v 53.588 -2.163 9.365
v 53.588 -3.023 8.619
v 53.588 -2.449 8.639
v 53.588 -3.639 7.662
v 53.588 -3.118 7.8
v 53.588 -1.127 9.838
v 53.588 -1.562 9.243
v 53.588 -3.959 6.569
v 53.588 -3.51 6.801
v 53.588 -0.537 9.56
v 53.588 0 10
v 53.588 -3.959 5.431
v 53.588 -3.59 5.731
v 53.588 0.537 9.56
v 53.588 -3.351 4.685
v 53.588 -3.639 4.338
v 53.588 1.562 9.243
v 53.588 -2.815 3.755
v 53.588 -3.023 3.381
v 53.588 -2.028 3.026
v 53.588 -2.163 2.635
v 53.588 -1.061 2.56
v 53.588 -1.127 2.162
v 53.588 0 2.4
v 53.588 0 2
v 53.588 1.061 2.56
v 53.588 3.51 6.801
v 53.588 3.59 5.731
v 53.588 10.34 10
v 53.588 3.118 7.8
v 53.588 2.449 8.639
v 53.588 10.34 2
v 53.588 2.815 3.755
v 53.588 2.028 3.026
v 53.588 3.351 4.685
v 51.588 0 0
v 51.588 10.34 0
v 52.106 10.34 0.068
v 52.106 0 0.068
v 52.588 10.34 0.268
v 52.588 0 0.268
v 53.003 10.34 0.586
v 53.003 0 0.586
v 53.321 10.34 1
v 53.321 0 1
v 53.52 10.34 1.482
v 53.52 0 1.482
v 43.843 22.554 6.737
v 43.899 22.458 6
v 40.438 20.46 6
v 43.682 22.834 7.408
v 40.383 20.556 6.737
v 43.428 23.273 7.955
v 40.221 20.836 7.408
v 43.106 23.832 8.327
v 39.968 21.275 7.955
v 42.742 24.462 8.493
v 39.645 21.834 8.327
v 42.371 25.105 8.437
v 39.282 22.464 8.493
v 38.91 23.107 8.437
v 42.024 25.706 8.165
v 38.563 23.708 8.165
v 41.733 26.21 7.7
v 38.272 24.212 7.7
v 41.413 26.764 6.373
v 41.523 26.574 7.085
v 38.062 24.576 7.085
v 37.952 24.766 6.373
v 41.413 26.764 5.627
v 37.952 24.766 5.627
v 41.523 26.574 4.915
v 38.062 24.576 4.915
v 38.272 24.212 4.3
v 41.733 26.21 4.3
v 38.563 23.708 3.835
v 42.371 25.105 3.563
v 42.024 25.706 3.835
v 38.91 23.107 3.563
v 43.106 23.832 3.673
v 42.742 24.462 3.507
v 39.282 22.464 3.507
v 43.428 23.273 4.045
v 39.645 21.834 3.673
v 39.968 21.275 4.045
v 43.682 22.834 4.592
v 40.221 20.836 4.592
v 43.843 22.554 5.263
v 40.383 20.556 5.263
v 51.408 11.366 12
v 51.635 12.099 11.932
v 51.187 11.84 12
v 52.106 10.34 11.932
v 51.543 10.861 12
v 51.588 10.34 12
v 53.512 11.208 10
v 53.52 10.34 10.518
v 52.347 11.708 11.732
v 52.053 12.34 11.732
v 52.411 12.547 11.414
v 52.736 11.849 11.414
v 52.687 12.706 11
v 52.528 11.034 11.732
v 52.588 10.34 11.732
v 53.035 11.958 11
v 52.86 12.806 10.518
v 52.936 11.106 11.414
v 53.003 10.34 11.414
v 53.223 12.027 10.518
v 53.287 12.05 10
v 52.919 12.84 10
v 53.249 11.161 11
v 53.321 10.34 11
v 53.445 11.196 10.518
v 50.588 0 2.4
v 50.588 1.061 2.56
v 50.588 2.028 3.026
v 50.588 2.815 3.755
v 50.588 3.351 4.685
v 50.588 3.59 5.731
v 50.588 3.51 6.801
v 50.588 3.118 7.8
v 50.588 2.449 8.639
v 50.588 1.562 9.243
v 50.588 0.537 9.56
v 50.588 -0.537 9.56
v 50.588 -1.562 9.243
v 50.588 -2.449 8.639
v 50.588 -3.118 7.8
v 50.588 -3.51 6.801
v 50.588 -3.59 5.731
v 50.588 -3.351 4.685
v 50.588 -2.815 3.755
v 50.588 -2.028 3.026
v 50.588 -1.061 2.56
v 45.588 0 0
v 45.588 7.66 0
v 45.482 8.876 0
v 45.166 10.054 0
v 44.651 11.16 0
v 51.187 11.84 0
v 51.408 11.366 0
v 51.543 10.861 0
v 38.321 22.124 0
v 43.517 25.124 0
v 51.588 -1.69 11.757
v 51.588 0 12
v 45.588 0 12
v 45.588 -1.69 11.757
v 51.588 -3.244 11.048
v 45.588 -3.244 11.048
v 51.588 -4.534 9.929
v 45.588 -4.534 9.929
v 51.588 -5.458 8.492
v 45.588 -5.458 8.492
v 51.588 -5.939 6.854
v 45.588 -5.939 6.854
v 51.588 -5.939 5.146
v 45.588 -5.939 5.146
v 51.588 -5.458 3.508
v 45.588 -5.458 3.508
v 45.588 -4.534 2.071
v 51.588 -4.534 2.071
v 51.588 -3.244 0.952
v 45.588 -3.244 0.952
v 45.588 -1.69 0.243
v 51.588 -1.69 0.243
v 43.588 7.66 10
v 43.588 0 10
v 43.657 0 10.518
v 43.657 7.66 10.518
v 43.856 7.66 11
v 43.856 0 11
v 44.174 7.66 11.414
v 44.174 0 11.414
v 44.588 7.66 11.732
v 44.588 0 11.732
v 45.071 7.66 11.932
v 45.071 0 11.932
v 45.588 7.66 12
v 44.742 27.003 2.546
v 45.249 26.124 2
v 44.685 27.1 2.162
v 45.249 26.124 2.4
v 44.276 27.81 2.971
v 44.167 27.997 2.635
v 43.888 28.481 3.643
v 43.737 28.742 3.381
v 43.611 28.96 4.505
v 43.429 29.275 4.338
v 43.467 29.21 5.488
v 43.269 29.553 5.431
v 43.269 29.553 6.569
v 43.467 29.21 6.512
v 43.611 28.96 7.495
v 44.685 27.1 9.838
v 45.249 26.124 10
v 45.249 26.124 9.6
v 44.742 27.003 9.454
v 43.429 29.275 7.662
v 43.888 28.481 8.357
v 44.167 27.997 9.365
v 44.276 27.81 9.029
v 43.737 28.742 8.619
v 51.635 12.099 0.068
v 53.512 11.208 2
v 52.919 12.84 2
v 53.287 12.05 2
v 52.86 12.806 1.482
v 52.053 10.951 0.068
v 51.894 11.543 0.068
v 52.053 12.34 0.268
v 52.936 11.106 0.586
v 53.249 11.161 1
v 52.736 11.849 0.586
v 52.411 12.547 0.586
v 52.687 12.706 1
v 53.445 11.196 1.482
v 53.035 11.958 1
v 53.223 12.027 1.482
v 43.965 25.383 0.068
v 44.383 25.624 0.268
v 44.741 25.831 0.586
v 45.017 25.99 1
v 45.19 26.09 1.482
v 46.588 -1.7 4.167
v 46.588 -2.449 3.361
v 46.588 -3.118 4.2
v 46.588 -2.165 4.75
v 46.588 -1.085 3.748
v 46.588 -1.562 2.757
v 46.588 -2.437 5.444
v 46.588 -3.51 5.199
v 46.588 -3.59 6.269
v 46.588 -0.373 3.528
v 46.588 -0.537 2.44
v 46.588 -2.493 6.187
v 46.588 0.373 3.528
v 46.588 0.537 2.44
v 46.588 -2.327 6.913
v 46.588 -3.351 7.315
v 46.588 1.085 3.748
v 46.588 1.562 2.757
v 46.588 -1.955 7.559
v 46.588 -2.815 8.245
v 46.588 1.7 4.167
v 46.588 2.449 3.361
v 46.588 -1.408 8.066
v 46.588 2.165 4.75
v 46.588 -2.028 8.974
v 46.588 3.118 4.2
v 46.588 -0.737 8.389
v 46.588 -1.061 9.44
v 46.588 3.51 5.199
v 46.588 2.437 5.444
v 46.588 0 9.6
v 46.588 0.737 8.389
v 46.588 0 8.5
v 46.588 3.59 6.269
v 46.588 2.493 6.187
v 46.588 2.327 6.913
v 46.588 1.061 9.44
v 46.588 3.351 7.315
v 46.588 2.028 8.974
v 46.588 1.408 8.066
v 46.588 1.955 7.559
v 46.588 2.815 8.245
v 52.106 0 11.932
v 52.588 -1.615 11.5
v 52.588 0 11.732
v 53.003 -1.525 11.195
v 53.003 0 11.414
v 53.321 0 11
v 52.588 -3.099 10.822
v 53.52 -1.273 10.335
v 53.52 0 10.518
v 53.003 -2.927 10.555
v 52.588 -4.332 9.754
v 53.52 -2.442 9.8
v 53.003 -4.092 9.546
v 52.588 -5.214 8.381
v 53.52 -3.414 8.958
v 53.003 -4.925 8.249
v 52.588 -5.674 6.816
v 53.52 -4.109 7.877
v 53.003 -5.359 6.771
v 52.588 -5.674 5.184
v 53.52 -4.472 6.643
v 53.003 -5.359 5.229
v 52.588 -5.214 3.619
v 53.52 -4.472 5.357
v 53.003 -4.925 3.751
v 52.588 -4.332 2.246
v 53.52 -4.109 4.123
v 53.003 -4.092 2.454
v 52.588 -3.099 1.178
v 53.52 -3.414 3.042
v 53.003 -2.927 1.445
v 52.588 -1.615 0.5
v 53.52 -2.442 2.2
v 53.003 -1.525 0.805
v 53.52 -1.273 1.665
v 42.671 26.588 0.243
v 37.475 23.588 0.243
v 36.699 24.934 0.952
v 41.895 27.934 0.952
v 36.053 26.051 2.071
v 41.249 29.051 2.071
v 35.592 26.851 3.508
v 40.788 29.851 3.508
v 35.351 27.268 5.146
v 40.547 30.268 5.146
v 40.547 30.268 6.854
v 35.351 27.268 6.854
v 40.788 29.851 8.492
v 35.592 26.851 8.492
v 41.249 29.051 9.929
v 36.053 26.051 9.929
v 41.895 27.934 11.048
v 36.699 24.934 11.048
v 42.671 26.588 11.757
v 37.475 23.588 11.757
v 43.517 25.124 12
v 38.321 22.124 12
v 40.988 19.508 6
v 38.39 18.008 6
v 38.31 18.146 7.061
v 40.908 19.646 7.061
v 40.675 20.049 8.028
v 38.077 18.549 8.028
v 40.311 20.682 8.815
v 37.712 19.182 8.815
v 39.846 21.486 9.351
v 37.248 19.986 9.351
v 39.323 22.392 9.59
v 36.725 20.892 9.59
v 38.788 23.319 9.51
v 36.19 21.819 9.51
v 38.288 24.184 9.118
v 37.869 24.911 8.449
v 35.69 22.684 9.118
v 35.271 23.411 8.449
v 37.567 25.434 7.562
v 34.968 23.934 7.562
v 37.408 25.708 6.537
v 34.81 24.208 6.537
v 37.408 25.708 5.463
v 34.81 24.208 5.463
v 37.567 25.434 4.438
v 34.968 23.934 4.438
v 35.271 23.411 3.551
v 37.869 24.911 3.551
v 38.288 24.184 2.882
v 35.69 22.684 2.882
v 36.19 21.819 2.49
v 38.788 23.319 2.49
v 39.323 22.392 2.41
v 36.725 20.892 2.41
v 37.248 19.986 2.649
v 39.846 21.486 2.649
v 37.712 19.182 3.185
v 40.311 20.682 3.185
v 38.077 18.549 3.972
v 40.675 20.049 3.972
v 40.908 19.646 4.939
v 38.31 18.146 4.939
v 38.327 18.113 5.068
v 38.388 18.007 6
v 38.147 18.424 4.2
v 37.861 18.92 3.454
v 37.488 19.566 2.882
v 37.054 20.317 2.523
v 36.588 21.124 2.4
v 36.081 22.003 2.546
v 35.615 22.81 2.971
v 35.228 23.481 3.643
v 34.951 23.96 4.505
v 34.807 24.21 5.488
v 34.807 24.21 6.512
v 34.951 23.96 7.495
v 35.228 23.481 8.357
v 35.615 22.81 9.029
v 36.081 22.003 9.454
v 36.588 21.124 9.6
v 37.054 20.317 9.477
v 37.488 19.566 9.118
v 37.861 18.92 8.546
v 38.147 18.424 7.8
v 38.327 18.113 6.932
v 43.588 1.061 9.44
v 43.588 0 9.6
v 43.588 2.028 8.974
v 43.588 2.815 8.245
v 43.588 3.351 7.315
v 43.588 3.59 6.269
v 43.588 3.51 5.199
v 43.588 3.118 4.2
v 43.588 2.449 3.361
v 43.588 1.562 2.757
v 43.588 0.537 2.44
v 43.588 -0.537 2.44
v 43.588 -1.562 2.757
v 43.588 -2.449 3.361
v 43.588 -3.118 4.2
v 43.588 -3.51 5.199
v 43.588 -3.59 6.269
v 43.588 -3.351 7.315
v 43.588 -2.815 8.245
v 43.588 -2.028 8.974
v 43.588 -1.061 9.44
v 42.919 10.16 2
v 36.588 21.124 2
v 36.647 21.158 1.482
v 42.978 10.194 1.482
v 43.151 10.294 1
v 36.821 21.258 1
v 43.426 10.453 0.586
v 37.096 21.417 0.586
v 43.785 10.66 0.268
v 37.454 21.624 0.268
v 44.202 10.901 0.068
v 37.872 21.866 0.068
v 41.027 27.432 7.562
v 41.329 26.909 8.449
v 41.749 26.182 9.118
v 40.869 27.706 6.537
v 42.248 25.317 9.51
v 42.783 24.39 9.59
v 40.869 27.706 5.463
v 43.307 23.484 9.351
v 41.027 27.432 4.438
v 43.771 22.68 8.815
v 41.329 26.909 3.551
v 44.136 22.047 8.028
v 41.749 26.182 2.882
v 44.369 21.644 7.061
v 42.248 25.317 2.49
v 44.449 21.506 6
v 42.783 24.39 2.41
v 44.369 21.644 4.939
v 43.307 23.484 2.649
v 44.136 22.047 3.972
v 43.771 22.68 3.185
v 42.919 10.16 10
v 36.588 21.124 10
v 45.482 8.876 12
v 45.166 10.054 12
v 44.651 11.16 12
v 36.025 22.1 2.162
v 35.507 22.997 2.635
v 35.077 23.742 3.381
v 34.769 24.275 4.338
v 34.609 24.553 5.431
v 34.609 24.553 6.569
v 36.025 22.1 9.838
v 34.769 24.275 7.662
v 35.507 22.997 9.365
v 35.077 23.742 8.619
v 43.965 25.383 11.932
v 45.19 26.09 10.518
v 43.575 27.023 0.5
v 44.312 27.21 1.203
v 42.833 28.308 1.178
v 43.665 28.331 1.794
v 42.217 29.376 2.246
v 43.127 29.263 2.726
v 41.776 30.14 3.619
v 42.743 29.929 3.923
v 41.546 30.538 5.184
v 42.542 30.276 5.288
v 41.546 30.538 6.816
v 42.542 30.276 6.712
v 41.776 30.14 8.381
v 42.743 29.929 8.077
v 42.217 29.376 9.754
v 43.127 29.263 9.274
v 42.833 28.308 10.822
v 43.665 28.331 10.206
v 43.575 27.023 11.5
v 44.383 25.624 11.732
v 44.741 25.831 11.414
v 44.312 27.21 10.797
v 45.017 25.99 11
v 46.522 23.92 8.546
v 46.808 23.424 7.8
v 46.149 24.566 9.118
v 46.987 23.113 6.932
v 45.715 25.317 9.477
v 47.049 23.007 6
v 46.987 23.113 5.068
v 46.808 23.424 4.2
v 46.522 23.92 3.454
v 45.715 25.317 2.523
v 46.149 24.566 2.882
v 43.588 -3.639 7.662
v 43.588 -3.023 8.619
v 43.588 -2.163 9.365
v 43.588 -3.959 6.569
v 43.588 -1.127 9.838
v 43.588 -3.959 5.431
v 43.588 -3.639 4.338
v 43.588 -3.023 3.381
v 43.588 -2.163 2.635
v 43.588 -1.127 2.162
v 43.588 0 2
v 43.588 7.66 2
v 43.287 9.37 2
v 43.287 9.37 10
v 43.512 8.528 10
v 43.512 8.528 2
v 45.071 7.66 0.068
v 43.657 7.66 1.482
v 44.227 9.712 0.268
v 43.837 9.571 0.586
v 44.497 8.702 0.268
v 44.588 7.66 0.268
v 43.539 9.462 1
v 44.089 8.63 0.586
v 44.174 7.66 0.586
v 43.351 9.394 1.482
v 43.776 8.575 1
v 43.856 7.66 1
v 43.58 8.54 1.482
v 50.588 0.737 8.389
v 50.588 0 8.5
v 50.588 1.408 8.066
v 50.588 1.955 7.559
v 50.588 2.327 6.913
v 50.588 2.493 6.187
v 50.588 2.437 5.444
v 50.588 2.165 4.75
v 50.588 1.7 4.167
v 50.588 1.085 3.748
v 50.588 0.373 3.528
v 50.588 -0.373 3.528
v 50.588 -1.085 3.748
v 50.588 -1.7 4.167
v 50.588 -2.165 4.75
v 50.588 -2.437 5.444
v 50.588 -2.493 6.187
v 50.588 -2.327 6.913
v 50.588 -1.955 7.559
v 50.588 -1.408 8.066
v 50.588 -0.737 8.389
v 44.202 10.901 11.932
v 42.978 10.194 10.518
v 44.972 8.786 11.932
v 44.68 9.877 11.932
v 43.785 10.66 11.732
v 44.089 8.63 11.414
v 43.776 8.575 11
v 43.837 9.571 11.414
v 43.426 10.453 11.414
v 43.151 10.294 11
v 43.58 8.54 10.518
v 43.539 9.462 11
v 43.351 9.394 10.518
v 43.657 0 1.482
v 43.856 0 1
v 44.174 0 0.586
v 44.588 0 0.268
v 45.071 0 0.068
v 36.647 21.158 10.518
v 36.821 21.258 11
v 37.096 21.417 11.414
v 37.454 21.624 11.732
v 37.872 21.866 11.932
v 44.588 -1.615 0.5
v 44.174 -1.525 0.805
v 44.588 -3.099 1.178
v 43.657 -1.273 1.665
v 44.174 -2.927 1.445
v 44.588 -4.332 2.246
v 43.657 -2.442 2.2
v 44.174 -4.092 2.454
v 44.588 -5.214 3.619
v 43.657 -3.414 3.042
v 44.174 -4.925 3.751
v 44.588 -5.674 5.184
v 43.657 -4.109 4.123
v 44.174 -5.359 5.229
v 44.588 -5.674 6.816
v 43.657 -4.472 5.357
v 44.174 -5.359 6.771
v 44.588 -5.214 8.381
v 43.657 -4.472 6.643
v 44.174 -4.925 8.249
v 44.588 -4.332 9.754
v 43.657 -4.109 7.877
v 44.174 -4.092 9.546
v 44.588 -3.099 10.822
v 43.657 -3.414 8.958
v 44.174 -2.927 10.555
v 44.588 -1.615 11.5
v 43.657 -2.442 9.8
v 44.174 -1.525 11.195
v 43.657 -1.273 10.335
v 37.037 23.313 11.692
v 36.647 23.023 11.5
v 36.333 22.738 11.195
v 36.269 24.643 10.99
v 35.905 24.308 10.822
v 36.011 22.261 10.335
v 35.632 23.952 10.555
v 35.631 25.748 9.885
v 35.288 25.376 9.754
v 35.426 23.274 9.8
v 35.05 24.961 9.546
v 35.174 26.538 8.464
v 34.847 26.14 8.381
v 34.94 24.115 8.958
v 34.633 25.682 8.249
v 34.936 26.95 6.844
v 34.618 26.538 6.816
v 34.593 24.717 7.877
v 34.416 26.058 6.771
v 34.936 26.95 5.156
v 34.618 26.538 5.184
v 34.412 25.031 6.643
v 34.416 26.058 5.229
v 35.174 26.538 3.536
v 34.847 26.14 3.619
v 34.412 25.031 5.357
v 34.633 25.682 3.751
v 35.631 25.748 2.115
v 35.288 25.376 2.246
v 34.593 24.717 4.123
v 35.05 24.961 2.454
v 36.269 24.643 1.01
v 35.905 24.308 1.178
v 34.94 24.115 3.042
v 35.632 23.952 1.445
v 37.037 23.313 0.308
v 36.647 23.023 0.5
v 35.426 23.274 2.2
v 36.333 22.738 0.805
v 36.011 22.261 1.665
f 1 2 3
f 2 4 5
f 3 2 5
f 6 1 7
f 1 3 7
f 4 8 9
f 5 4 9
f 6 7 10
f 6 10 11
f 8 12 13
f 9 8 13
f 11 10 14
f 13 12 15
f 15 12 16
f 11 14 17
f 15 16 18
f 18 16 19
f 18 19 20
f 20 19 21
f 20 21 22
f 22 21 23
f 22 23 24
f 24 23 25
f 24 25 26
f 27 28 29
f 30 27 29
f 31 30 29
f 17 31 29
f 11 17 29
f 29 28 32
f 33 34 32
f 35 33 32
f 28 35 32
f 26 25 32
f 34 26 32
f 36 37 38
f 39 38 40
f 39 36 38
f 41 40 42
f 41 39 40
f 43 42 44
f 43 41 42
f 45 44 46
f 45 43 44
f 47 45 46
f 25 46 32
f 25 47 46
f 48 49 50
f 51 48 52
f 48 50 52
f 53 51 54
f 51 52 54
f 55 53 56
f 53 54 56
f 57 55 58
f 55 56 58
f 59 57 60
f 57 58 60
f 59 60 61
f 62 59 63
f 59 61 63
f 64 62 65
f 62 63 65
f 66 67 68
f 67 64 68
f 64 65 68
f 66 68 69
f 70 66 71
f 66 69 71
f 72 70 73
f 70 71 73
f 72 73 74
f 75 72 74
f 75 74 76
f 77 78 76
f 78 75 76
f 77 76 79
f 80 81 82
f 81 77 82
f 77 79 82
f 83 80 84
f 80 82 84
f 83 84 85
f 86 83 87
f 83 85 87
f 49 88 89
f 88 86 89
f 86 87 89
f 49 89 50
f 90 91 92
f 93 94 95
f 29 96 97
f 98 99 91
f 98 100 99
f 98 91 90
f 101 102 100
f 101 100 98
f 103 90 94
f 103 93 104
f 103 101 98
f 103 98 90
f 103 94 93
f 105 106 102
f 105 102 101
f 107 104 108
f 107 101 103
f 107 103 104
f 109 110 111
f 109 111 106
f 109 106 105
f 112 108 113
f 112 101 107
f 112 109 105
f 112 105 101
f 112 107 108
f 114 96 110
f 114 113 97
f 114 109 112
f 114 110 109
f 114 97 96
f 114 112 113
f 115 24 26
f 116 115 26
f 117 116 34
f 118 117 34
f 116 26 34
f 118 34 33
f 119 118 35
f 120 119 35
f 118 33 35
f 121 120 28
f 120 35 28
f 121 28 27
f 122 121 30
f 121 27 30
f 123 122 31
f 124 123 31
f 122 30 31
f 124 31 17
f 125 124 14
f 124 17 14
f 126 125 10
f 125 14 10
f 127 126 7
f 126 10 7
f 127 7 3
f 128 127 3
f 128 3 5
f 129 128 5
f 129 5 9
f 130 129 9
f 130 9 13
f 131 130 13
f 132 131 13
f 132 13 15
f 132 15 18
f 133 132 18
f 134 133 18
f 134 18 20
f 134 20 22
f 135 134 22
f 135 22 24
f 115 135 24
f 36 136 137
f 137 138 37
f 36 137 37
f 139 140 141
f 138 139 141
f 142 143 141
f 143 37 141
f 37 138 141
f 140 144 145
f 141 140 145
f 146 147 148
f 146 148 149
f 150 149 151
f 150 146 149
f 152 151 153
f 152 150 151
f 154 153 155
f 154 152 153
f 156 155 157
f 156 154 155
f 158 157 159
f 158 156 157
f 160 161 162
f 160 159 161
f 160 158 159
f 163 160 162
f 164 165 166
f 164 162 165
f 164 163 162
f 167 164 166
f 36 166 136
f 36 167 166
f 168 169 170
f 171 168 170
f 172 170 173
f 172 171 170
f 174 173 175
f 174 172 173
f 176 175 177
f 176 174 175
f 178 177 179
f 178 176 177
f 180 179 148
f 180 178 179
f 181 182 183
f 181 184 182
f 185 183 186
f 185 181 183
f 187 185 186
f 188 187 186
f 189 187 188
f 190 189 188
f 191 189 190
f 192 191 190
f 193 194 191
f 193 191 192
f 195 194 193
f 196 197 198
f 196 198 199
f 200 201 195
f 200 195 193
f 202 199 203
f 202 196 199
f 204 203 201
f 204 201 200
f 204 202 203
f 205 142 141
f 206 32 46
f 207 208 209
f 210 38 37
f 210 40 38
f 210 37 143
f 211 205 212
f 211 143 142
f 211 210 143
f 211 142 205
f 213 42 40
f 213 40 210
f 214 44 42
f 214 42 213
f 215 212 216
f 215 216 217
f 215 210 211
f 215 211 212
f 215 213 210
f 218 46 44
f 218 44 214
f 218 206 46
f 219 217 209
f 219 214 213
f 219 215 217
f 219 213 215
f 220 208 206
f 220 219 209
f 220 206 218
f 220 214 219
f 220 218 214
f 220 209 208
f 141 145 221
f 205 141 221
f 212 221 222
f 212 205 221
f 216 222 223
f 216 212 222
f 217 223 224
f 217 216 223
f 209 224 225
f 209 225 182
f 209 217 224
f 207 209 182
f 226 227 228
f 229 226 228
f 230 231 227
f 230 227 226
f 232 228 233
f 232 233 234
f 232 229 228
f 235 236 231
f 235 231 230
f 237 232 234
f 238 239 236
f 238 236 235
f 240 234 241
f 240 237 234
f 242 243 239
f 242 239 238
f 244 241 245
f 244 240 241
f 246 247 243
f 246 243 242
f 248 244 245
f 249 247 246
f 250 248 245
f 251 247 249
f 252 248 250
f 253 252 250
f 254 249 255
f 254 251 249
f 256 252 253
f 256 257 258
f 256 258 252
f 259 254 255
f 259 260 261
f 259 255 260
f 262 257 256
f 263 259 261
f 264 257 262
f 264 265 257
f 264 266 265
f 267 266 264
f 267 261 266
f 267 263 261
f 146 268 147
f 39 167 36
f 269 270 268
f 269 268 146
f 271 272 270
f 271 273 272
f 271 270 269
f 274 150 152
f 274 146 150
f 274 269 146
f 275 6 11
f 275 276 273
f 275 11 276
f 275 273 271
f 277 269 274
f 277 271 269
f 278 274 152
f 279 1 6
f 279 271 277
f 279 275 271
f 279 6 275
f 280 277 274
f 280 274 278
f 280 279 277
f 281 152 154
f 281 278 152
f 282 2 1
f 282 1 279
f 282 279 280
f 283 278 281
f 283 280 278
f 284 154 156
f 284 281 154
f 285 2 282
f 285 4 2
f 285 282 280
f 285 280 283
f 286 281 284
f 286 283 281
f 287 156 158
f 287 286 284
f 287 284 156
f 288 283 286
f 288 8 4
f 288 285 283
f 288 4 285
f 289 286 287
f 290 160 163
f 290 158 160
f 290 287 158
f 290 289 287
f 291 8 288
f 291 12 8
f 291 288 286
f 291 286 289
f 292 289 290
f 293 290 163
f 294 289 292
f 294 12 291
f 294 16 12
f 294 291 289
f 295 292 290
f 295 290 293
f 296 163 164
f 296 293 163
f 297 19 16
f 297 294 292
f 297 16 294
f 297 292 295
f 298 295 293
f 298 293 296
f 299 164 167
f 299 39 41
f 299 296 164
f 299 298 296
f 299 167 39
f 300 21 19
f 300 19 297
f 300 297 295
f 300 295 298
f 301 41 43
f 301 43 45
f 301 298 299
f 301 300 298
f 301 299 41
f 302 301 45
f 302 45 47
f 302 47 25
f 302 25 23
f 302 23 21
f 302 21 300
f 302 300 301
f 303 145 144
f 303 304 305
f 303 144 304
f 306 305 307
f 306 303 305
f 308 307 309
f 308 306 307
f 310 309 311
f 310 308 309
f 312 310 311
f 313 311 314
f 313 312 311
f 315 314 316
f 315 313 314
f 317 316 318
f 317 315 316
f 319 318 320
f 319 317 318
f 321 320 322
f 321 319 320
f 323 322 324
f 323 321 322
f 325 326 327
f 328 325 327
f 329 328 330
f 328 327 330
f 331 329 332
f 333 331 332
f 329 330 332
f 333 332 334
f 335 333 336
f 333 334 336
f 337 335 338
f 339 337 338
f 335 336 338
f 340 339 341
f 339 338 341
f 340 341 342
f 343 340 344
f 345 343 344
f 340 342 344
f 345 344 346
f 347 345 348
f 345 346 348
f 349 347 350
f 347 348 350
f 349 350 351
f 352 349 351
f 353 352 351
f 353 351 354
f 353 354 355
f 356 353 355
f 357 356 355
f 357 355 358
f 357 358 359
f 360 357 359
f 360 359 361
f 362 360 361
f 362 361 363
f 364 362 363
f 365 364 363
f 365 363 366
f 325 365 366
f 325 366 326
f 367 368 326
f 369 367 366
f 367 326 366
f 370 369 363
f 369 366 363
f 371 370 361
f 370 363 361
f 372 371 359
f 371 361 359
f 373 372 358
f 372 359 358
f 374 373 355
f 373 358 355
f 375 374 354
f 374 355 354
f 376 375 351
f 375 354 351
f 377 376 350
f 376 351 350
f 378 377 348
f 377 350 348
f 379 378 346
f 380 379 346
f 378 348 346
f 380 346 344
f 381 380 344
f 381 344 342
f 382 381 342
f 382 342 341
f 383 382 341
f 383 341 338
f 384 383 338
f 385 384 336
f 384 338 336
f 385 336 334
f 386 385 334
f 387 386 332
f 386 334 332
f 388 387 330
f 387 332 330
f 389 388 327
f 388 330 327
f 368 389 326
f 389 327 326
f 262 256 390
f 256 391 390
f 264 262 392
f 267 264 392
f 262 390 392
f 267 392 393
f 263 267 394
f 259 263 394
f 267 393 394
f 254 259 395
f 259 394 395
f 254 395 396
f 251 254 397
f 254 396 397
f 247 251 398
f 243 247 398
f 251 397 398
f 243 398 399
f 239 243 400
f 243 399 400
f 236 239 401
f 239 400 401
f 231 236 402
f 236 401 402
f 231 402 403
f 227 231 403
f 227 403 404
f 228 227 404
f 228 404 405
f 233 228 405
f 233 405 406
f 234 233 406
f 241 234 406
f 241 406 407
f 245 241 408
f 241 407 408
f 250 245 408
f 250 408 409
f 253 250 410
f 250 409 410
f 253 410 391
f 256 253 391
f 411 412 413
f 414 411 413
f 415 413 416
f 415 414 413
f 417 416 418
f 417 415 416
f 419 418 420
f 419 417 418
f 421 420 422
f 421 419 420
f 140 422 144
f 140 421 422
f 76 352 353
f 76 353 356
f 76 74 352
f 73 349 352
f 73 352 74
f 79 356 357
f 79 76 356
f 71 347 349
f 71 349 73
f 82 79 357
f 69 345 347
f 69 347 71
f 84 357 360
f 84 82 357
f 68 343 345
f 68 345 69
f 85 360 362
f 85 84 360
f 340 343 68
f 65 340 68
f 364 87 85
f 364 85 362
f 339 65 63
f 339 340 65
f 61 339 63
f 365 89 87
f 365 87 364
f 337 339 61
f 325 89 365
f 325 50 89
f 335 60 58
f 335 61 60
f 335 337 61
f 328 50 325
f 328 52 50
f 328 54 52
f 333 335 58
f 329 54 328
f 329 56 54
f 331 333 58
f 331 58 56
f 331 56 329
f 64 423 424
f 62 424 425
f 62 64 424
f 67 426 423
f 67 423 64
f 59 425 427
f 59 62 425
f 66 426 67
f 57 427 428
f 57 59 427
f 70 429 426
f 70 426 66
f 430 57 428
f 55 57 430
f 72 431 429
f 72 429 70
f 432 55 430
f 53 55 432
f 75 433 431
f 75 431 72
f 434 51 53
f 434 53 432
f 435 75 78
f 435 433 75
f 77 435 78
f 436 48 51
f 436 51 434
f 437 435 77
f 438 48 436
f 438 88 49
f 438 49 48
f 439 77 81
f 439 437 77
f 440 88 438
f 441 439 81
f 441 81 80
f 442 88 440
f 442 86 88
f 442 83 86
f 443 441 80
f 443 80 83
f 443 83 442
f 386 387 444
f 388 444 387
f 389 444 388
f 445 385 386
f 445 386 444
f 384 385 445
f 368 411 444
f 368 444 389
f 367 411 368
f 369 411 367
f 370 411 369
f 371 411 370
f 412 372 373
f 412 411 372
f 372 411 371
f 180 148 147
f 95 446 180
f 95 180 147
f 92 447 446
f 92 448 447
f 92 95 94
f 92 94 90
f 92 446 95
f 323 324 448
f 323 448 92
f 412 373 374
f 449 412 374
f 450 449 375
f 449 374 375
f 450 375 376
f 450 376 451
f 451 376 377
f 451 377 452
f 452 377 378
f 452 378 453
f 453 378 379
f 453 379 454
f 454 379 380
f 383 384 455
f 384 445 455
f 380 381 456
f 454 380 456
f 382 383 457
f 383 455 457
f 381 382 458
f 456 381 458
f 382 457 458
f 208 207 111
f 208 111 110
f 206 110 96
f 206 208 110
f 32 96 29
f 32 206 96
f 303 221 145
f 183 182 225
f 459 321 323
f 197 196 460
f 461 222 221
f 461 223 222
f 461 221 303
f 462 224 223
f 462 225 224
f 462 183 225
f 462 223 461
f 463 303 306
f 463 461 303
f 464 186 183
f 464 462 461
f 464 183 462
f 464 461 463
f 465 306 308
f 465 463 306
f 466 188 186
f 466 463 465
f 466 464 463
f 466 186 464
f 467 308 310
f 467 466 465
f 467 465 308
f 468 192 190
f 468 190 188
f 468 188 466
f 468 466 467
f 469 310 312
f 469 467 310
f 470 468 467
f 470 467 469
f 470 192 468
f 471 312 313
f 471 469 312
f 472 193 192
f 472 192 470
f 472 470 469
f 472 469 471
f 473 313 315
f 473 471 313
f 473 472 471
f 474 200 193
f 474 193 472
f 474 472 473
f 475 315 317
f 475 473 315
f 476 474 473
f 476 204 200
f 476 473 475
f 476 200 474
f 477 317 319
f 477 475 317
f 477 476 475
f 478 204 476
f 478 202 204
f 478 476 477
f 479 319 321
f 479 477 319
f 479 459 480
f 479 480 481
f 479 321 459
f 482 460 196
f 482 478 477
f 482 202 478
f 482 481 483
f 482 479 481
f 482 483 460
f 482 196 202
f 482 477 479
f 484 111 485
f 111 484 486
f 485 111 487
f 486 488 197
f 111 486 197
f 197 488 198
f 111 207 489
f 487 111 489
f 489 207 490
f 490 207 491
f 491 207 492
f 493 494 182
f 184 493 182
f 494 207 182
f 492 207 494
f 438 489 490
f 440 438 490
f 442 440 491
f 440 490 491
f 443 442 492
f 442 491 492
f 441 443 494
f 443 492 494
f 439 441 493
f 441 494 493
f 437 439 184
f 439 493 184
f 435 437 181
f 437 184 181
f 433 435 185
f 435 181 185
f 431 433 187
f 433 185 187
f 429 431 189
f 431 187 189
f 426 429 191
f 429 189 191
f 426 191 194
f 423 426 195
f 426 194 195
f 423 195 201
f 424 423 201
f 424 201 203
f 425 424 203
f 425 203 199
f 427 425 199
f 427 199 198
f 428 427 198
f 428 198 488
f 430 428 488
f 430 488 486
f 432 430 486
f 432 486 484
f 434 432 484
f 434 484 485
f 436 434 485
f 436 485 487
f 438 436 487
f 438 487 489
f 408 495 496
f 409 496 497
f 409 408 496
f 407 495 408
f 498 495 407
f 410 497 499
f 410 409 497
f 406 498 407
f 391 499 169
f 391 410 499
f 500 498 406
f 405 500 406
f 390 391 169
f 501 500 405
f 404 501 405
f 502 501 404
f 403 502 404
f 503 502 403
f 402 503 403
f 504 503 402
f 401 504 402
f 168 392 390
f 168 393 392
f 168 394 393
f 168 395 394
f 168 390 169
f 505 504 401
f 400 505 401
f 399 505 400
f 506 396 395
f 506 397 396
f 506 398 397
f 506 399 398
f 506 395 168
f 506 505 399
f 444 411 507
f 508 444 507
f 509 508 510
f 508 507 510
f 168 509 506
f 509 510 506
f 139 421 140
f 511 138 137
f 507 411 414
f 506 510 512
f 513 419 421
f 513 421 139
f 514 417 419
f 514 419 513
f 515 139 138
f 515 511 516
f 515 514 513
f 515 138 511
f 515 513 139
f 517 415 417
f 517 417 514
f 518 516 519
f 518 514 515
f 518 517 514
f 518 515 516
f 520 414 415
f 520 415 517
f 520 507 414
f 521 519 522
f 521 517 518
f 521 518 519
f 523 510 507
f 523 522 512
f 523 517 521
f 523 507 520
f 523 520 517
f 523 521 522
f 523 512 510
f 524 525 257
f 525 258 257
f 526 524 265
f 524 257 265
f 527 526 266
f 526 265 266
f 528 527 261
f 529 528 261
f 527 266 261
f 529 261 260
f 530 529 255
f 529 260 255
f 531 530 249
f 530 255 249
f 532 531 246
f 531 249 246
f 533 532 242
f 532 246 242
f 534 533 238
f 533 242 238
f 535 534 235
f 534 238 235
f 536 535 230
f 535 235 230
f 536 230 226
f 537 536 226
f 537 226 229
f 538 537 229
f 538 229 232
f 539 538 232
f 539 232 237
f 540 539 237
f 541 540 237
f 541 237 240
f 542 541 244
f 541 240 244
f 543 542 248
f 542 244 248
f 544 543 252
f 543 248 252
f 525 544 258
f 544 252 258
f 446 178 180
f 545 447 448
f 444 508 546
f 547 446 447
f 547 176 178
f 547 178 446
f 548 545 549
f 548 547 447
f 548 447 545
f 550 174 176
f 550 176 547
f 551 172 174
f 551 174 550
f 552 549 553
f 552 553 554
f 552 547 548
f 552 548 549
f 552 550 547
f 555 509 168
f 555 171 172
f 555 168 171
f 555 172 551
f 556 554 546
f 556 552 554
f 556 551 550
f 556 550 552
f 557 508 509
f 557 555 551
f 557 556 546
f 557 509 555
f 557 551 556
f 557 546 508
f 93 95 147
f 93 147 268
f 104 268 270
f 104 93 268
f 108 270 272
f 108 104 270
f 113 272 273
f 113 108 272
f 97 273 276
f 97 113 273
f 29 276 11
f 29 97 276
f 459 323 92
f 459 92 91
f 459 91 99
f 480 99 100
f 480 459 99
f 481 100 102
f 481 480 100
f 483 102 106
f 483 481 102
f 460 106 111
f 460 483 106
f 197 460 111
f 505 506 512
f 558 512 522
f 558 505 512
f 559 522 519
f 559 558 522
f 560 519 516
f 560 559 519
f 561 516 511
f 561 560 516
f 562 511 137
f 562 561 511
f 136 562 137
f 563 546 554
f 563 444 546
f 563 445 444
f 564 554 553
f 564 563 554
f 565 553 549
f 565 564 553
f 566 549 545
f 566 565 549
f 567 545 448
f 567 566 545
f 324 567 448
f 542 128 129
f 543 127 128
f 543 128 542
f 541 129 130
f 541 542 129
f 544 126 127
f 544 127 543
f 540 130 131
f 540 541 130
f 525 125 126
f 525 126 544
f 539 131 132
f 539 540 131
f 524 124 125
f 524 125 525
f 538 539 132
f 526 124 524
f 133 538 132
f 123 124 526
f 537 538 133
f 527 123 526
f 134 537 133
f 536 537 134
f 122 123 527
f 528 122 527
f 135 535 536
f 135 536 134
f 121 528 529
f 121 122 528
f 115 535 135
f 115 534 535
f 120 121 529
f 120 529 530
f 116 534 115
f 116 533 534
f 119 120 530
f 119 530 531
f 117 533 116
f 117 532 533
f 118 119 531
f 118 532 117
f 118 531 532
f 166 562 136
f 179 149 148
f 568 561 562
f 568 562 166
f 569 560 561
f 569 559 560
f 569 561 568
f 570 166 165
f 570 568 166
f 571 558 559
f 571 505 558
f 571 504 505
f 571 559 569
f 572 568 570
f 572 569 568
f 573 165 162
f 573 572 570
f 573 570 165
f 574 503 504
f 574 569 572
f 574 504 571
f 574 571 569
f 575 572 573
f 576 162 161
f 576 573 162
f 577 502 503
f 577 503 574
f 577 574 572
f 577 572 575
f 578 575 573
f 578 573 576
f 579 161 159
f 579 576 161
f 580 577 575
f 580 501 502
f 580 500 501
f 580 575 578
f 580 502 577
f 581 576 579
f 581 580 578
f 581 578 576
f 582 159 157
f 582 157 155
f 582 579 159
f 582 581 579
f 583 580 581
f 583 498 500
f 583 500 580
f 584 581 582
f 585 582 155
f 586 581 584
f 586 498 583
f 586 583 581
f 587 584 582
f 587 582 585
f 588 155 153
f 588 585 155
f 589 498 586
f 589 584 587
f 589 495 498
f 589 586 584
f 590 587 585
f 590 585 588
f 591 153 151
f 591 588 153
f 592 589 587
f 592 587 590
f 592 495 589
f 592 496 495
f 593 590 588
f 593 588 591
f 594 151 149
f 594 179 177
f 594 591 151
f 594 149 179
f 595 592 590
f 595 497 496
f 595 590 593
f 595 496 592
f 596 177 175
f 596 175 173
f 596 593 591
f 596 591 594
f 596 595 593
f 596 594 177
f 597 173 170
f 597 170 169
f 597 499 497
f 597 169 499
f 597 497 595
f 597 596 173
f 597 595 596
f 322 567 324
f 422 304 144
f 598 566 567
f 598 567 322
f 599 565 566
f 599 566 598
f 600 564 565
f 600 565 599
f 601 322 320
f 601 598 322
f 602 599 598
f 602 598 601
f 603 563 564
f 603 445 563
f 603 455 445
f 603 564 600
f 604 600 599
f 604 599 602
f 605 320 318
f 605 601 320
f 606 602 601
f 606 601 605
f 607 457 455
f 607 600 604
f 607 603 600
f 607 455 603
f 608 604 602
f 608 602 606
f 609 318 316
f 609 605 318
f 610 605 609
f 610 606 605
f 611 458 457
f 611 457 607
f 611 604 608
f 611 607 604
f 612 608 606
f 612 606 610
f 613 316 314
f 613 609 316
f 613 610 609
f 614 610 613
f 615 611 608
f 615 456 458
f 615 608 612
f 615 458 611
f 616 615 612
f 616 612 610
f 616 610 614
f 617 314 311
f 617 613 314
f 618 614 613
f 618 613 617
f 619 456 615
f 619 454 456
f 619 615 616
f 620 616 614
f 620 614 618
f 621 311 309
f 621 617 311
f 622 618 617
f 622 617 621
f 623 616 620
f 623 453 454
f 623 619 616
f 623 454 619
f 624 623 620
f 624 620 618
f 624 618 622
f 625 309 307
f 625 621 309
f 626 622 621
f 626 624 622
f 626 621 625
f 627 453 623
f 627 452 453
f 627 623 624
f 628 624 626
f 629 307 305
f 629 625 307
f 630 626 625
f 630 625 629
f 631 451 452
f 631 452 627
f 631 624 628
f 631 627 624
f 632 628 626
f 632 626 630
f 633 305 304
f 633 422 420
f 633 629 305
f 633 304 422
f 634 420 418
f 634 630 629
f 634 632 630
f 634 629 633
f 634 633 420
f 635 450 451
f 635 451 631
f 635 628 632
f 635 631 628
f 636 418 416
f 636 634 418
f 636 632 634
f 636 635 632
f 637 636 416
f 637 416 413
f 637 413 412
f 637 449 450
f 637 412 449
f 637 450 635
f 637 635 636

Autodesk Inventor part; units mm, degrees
ref_plane "YZ Plane" through (0, 0, 0) normal (1, 0, 0) x (0, 1, 0)
sketch "Sketch1" plane through (0, 0, 0) normal (0, 0, 1) x (1, 0, 0)
  line L0 (53.588457, 0) -> (0, 0)
  line L1 (0, 0) -> (60.328682, 34.830781)
  line L2 (43.588457, 0) -> (43.588457, 7.660254)
  line L3 (42.918584, 10.160254) -> (36.588457, 21.124356)
  line L4 (53.588457, 0) -> (53.588457, 10.339746)
  line L5 (52.918584, 12.839746) -> (45.248711, 26.124356)
  arc A0 (43.588457, 7.660254) -> (42.918584, 10.160254) centre (38.588457, 7.660254) ccw
  arc A1 (53.588457, 10.339746) -> (52.918584, 12.839746) centre (48.588457, 10.339746) ccw
  line L6 (45.248711, 26.124356) -> (36.588457, 21.124356)
  line L7 (45.248711, 26.124356) -> (52.918584, 12.839746)
  line L8 (36.588457, 21.124356) -> (42.918584, 10.160254)
  line L9 (43.588457, 0) -> (53.588457, 0)
  line L10 (53.588457, 0) -> (53.588457, 10.339746)
  line L11 (43.588457, 0) -> (53.588457, 0)
  line L12 (53.588457, 0) -> (53.588457, 10.339746)
  line L13 (52.918584, 12.839746) -> (45.248711, 26.124356)
  line L14 (45.248711, 26.124356) -> (36.588457, 21.124356)
  line L15 (36.588457, 21.124356) -> (42.918584, 10.160254)
  line L16 (43.588457, 7.660254) -> (43.588457, 0)
  point P0 (43.30127, 25)
  point P1 (43.588457, 9)
  dimension "d37" = 30
  dimension "d38" = 10
  dimension "d39" = 10
  dimension "d40" = 0
  dimension "d41" = 0
  dimension "d42" = 9
  dimension "d43" = 14
  dimension "d44" = 150
  dimension "d45" = 5
extrude "Extrusion1" add sketch "Sketch1" along normal blind 12 contours L0 L2 A0 L3 L1 L5 A1 L4
ref_plane "Work Plane1" through (52.918584, 12.839746, 0) normal (0.8660254, 0.5, 0) x (-0.5, 0.8660254, 0)
sketch "Sketch2" plane through (52.918584, 12.839746, 0) normal (0.8660254, 0.5, 0) x (-0.5, 0.8660254, 0)
  circle A0 centre (15.339746, 6) radius 6
  line L0 (15.339746, 0) -> (15.339746, 12)
  line L1 (0, 12) -> (15.339746, 12)
  dimension "d5" = 12
  dimension "d47" = 0
  dimension "d48" = 6
extrude "Extrusion2" add sketch "Sketch2" against normal blind 10
ref_plane "Work Plane2" through (53.588457, 10.339746, 0) normal (1, 0, 0) x (0, 1, 0)
sketch "Sketch3" plane through (53.588457, 10.339746, 0) normal (1, 0, 0) x (0, 1, 0)
  circle A0 centre (-10.339746, 6) radius 6
  line L0 (-10.339746, 0) -> (-10.339746, 12)
  line L1 (-10.339746, 0) -> (0, 0)
  point P0 (43.30127, 10)
  point P1 (10.78461, 12)
  dimension "d10" = 12
  dimension "d49" = 0
  dimension "d50" = 6
extrude "Extrusion3" add sketch "Sketch3" against normal blind 10
sketch "Sketch4" plane through (44.25833, 7.839746, 0) normal (-0.8660254, -0.5, 0) x (0.5, -0.8660254, 0)
  circle A0 centre (-15.339746, 6) radius 2.5
  circle A1 centre (-15.339746, 6) radius 6
  point P0 (-15.339746, 0)
  point P1 (-15.339746, 12)
  dimension "d15" = 5
extrude "Extrusion4" cut sketch "Sketch4" along normal through all both and the other way through all contours A0
sketch "Sketch5" plane through (43.588457, 10.339746, 0) normal (-1, 0, 0) x (0, 0, 1)
  circle A0 centre (6, -10.339746) radius 2.5
  arc A1 (0, -10.339746) -> (12, -10.339746) centre (6, -10.339746) ccw
  dimension "d18" = 5
extrude "Extrusion5" cut sketch "Sketch5" along normal through all both and the other way through all
sketch "Sketch6" plane through (52.918584, 12.839746, 0) normal (0.8660254, 0.5, 0) x (0.5, -0.8660254, 0)
  circle A0 centre (-15.339746, -6) radius 3.6
  circle A1 centre (-15.339746, -6) radius 2.5
  arc A2 (-15.339746, 0) -> (-15.339746, 0) centre (-15.339746, -6) ccw
  point P0 (0, -10)
  dimension "d21" = 5
  dimension "d22" = 7.2
extrude "Extrusion6" cut sketch "Sketch6" against normal blind 3 contours A0
sketch "Sketch7" plane through (44.25833, 7.839746, 0) normal (-0.8660254, -0.5, 0) x (0.5, -0.8660254, 0)
  circle A0 centre (-15.339746, 6) radius 3.6
  circle A1 centre (-15.339746, 6) radius 2.5
  arc A2 (-12.839746, 6) -> (-12.839746, 6) centre (-15.339746, 6) ccw
  point P0 (-15.339746, 0)
  dimension "d25" = 5
  dimension "d26" = 7.2
extrude "Extrusion7" cut sketch "Sketch7" along normal mid plane 6
sketch "Sketch8" plane through (43.588457, 10.339746, 0) normal (-1, 0, 0) x (0, 0, 1)
  circle A0 centre (6, -10.339746) radius 3.6
  circle A1 centre (6, -10.339746) radius 2.5
  arc A2 (8.5, -10.339746) -> (8.5, -10.339746) centre (6, -10.339746) ccw
  point P0 (0, -10.339746)
  dimension "d29" = 7.2
  dimension "d30" = 5
extrude "Extrusion8" cut sketch "Sketch8" along normal mid plane 6
sketch "Sketch9" plane through (53.588457, 10.339746, 0) normal (1, 0, 0) x (0, 0, -1)
  circle A0 centre (-6, -10.339746) radius 3.6
  circle A1 centre (-6, -10.339746) radius 2.5
  circle A2 centre (-6, -10.339746) radius 2.5
  point P0 (0, -10.339746)
  dimension "d33" = 5
  dimension "d34" = 7.2
extrude "Extrusion9" cut sketch "Sketch9" against normal blind 3
fillet "Fillet1" radius 2 16 edges at (42.2487, 31.3205, 6) (49.0836, 19.4821, 0) (53.4181, 11.6338, 0) (53.5885, 5.1699, 0) (53.5885, -6, 6) (53.5885, 5.1699, 12) (53.4181, 11.6338, 12) (49.0836, 19.4821, 12) (43.4181, 8.9543, 12) (43.5885, 3.8301, 12) (43.5885, -6, 6) (43.5885, 3.8301, 0) (43.4181, 8.9543, 0) (39.7535, 15.6423, 0) (33.5885, 26.3205, 6) (39.7535, 15.6423, 12)
equation "\"d38\" = d46"
equation "\"d39\" = d46"
equation "\"d3\" = width"
equation "\"d5\" = width"
equation "\"d48\" = 0.5 * width"
equation "\"d8\" = thickness"
equation "\"d10\" = width"
equation "\"d50\" = 0.5 * width"
equation "\"d13\" = thickness"
equation "\"thickness\" = 10"
equation "\"width\" = 12"
equation "\"d46\" = 10"
properties part number "Link2"
